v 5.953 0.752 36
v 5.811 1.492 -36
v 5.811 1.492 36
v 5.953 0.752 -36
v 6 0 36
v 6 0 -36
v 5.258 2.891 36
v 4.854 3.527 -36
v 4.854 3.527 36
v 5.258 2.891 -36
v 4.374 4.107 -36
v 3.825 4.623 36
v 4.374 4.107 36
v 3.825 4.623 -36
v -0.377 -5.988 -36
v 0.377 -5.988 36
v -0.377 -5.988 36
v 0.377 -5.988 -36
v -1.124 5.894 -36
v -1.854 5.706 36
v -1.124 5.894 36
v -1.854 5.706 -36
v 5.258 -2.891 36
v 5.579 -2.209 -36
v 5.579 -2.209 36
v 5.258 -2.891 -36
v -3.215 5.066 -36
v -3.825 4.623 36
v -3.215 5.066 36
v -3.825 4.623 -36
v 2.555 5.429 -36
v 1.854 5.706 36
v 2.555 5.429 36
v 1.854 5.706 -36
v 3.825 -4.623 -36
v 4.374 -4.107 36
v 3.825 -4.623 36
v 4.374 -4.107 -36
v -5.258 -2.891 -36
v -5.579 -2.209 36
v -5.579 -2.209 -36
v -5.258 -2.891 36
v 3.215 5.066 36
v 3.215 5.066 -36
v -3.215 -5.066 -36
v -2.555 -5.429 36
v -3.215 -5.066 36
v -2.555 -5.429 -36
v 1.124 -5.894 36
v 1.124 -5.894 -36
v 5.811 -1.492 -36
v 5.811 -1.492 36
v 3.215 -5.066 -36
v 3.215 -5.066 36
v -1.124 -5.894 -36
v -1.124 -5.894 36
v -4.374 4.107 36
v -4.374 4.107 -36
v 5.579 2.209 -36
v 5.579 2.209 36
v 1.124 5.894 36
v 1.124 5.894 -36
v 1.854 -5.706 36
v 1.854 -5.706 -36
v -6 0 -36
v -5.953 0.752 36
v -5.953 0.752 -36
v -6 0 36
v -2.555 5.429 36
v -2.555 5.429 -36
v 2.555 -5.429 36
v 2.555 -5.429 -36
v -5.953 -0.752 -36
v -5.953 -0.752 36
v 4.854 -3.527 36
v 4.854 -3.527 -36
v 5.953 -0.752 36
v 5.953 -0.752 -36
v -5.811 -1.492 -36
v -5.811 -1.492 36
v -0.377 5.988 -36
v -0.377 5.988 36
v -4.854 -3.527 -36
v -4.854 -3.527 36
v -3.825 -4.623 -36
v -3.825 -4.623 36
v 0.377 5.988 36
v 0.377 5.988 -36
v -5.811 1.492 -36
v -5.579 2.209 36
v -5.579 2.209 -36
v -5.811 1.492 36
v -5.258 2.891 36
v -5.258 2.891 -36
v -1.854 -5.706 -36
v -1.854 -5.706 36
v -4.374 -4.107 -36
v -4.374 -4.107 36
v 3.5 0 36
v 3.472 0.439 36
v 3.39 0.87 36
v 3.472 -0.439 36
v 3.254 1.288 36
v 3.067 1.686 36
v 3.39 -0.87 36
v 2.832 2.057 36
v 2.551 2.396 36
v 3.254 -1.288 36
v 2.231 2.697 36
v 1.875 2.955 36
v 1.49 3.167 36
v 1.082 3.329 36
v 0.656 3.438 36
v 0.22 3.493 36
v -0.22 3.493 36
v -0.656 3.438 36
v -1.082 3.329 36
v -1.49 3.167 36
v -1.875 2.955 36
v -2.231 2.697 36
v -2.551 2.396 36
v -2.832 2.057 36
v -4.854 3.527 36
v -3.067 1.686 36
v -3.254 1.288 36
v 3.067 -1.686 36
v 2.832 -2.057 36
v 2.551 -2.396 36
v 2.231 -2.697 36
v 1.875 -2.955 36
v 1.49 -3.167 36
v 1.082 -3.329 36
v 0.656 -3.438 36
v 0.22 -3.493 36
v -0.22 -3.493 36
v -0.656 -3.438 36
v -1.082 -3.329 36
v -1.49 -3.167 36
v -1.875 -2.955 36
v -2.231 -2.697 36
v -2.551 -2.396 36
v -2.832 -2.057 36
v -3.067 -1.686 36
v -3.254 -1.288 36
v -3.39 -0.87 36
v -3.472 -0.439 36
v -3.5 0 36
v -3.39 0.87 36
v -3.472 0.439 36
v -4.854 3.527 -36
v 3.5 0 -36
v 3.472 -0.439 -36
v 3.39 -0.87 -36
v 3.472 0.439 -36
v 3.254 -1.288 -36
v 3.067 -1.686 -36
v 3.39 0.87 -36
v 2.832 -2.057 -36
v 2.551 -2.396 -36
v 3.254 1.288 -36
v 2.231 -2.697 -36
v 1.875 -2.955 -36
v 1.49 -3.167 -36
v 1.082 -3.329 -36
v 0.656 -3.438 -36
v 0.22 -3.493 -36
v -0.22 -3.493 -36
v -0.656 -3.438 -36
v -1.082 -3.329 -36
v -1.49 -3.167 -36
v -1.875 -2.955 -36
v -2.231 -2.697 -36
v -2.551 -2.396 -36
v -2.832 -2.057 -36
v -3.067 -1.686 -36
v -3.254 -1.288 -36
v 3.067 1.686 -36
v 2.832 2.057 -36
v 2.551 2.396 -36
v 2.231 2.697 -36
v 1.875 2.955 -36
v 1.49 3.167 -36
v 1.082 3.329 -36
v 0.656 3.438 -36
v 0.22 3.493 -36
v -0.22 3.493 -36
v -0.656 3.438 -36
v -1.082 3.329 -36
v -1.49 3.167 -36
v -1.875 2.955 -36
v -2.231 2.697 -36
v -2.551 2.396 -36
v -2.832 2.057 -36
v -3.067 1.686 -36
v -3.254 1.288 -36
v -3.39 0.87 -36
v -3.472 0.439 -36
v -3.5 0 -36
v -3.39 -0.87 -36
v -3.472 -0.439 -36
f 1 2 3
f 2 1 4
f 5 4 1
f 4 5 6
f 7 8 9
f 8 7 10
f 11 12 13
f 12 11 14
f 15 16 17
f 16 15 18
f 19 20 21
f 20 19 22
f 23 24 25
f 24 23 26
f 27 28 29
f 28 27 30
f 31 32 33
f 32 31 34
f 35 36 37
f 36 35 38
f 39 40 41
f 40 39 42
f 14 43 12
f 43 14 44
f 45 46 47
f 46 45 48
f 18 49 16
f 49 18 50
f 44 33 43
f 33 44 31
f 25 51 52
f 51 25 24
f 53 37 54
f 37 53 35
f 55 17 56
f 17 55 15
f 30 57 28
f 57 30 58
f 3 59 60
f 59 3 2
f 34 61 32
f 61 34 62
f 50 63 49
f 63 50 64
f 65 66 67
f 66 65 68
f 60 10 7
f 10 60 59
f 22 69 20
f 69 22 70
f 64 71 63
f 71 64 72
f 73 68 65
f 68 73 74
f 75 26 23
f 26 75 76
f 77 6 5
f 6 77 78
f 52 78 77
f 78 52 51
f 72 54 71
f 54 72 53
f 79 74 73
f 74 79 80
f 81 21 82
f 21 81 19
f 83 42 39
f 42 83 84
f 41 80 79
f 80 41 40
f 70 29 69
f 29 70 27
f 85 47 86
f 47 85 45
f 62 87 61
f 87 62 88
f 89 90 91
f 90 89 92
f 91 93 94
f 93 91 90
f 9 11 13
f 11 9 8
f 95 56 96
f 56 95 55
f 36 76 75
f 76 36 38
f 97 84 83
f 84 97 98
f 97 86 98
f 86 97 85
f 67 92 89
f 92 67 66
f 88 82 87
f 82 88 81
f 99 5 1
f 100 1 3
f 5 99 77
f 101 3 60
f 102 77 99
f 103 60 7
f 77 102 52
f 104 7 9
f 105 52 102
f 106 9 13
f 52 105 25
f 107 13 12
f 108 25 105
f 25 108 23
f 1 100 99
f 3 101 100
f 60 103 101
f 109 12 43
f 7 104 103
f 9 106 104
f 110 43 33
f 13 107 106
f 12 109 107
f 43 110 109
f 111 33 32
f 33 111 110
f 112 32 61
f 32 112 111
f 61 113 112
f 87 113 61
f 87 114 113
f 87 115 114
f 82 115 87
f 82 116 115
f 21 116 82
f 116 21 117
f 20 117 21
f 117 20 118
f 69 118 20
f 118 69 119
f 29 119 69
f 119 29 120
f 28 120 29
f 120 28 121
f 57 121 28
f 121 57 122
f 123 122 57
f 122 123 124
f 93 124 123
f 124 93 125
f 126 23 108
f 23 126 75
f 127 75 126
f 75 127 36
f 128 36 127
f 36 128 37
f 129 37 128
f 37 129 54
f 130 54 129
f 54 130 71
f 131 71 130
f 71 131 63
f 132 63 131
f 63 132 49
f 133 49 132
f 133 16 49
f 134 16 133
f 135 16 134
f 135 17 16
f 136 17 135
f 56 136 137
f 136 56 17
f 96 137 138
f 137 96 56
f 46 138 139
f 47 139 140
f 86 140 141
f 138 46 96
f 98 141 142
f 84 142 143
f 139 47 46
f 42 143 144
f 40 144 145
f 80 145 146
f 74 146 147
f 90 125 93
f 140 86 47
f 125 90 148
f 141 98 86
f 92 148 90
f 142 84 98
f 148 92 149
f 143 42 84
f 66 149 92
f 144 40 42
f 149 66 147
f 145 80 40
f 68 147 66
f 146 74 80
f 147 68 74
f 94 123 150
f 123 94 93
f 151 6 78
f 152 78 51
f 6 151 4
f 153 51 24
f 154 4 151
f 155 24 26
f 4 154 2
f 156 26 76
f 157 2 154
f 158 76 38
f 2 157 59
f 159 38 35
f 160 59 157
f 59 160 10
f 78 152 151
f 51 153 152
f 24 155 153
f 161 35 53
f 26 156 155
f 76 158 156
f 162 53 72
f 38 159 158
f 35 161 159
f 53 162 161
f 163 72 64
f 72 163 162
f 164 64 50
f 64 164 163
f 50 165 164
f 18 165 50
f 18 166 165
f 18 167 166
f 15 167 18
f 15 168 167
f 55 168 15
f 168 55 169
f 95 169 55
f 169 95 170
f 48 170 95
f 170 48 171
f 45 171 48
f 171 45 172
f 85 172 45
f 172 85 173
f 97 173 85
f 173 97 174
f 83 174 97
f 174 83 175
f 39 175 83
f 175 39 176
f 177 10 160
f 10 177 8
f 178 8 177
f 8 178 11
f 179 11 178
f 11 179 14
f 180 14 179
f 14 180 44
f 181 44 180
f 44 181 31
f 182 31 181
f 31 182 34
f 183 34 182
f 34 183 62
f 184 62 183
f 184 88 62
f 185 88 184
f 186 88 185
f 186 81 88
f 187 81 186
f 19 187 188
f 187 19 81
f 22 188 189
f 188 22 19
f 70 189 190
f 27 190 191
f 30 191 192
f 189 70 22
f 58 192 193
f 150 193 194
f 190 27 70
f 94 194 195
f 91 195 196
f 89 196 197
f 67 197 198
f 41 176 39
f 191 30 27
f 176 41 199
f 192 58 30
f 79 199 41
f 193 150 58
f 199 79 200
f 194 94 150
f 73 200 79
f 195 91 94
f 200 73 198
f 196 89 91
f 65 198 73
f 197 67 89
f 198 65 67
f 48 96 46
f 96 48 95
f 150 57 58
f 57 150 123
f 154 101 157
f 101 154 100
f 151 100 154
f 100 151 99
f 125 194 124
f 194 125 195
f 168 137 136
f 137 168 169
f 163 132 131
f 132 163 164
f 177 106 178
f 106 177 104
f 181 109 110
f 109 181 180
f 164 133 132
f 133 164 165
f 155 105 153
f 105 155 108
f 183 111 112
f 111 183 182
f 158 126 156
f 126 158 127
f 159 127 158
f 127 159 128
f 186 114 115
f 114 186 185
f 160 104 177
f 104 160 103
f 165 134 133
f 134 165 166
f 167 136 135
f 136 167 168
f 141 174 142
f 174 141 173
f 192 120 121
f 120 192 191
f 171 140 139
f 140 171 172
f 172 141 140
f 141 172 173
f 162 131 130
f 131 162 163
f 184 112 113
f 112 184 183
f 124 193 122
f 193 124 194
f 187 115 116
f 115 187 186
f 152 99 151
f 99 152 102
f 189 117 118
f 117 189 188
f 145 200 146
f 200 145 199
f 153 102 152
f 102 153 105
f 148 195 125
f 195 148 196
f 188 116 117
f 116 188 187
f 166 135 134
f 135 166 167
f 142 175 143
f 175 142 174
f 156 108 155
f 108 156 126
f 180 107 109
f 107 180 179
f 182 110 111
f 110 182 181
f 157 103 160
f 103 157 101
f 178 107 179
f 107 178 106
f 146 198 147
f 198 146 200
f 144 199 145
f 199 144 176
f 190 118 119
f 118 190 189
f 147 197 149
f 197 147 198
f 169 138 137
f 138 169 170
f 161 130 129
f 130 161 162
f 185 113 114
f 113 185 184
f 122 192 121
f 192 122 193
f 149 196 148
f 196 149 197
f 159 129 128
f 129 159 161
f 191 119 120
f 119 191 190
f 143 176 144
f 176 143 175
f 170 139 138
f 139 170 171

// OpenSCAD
$fn = 50;


difference() {
	union() {
		translate(v = [0, 0, -36.0000000000]) {
			cylinder(h = 72, r = 6.0000000000);
		}
	}
	union() {
		translate(v = [0, 0, -100.0000000000]) {
			cylinder(h = 200, r = 3.5000000000);
		}
	}
}
